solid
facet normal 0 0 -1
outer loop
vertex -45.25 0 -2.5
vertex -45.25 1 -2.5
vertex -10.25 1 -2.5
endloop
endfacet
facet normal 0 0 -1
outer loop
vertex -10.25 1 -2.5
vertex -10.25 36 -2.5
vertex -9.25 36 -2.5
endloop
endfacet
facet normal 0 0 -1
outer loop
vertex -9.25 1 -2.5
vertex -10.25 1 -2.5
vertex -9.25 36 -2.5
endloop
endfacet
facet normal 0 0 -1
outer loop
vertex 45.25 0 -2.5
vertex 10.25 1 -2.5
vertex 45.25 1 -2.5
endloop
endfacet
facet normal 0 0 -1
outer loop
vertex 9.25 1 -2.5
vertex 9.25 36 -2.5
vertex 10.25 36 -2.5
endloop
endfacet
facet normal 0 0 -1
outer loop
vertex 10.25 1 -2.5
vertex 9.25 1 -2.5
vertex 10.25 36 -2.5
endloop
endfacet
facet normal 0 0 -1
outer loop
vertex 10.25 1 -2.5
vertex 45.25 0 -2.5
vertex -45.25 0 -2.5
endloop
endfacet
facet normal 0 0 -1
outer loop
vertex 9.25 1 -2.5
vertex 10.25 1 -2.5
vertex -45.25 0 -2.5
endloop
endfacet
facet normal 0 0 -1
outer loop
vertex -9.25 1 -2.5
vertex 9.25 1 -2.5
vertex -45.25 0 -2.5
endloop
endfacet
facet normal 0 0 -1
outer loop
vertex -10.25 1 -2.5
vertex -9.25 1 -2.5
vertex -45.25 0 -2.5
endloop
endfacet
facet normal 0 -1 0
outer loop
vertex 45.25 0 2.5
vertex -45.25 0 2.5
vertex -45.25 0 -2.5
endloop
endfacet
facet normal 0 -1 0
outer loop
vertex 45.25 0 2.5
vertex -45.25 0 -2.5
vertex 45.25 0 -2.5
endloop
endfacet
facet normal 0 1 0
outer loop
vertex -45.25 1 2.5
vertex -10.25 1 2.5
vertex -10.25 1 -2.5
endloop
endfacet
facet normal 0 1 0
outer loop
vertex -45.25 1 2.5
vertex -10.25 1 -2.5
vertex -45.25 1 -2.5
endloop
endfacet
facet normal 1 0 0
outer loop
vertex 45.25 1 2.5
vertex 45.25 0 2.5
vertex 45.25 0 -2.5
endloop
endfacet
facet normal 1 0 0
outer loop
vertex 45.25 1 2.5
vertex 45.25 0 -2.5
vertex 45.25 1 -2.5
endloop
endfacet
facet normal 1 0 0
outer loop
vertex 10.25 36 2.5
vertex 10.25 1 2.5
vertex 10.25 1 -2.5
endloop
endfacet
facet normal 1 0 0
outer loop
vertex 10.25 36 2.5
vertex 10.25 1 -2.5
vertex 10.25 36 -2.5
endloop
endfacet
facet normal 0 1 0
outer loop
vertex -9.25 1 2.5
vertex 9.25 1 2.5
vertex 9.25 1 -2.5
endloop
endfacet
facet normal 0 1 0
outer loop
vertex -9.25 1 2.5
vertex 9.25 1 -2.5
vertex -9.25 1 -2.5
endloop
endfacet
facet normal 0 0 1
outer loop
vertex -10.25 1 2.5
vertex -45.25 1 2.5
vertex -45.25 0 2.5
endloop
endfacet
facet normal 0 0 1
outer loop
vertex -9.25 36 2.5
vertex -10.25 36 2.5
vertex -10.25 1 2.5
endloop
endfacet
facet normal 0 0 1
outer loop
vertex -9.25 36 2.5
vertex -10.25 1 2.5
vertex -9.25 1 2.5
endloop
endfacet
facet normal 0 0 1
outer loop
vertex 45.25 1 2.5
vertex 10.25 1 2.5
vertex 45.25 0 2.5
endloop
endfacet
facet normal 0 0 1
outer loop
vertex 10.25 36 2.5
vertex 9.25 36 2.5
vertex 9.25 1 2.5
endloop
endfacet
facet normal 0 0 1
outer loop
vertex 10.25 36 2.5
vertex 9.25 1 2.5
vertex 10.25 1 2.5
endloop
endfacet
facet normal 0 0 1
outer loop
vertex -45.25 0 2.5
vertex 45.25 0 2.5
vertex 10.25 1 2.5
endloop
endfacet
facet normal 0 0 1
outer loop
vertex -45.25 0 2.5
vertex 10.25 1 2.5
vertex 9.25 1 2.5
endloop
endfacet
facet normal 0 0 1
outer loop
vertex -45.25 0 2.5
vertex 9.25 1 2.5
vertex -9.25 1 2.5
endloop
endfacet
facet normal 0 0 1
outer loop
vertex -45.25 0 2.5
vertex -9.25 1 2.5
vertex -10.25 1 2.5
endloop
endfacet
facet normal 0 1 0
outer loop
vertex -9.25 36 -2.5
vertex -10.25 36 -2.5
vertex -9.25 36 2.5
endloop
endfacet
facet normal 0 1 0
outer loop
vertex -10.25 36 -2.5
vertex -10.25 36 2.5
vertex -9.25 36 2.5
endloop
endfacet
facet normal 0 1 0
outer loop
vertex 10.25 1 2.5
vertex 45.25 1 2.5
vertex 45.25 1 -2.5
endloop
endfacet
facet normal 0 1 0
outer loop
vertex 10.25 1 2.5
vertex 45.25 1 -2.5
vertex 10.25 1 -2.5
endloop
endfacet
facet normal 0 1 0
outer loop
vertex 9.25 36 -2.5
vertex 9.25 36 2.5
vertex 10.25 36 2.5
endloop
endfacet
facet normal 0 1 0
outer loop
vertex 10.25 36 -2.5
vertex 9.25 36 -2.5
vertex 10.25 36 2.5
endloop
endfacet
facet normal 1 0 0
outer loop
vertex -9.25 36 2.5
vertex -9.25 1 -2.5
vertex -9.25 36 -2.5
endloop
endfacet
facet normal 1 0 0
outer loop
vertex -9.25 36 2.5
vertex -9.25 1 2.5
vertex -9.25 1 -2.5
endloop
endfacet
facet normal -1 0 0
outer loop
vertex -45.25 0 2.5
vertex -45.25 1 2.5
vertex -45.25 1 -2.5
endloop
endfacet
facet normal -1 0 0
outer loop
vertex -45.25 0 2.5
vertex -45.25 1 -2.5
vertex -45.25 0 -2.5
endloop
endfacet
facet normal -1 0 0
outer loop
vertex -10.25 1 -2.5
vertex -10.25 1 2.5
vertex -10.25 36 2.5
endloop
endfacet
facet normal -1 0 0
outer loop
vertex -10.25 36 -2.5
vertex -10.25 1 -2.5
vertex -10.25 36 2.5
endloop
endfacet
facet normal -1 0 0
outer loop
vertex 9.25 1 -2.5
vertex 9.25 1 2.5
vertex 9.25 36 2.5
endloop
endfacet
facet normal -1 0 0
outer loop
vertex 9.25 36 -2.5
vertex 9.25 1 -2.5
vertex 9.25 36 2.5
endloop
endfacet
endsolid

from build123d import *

# Parameters (mm, degrees)
F0_W     = 1
F0_H     = 35
F1_DEPTH = 2.5


with BuildPart() as f1:
    # F0 (on Top) → F1 (new body, symmetric)
    with BuildSketch(Plane.XY):
        with Locations((-9.75, 18.5)):
            Rectangle(F0_W, F0_H)
        with Locations((9.75, 18.5)):
            Rectangle(F0_W, F0_H)
        Polygon((0, 1), (0, 0), (45.25, 0), (45.25, 1), (10.25, 1), (9.25, 1), align=None)
        Polygon((-45.25, 0), (0, 0), (0, 1), (-9.25, 1), (-10.25, 1), (-45.25, 1), align=None)
    extrude(amount=F1_DEPTH, both=True)


solid = f1.part
